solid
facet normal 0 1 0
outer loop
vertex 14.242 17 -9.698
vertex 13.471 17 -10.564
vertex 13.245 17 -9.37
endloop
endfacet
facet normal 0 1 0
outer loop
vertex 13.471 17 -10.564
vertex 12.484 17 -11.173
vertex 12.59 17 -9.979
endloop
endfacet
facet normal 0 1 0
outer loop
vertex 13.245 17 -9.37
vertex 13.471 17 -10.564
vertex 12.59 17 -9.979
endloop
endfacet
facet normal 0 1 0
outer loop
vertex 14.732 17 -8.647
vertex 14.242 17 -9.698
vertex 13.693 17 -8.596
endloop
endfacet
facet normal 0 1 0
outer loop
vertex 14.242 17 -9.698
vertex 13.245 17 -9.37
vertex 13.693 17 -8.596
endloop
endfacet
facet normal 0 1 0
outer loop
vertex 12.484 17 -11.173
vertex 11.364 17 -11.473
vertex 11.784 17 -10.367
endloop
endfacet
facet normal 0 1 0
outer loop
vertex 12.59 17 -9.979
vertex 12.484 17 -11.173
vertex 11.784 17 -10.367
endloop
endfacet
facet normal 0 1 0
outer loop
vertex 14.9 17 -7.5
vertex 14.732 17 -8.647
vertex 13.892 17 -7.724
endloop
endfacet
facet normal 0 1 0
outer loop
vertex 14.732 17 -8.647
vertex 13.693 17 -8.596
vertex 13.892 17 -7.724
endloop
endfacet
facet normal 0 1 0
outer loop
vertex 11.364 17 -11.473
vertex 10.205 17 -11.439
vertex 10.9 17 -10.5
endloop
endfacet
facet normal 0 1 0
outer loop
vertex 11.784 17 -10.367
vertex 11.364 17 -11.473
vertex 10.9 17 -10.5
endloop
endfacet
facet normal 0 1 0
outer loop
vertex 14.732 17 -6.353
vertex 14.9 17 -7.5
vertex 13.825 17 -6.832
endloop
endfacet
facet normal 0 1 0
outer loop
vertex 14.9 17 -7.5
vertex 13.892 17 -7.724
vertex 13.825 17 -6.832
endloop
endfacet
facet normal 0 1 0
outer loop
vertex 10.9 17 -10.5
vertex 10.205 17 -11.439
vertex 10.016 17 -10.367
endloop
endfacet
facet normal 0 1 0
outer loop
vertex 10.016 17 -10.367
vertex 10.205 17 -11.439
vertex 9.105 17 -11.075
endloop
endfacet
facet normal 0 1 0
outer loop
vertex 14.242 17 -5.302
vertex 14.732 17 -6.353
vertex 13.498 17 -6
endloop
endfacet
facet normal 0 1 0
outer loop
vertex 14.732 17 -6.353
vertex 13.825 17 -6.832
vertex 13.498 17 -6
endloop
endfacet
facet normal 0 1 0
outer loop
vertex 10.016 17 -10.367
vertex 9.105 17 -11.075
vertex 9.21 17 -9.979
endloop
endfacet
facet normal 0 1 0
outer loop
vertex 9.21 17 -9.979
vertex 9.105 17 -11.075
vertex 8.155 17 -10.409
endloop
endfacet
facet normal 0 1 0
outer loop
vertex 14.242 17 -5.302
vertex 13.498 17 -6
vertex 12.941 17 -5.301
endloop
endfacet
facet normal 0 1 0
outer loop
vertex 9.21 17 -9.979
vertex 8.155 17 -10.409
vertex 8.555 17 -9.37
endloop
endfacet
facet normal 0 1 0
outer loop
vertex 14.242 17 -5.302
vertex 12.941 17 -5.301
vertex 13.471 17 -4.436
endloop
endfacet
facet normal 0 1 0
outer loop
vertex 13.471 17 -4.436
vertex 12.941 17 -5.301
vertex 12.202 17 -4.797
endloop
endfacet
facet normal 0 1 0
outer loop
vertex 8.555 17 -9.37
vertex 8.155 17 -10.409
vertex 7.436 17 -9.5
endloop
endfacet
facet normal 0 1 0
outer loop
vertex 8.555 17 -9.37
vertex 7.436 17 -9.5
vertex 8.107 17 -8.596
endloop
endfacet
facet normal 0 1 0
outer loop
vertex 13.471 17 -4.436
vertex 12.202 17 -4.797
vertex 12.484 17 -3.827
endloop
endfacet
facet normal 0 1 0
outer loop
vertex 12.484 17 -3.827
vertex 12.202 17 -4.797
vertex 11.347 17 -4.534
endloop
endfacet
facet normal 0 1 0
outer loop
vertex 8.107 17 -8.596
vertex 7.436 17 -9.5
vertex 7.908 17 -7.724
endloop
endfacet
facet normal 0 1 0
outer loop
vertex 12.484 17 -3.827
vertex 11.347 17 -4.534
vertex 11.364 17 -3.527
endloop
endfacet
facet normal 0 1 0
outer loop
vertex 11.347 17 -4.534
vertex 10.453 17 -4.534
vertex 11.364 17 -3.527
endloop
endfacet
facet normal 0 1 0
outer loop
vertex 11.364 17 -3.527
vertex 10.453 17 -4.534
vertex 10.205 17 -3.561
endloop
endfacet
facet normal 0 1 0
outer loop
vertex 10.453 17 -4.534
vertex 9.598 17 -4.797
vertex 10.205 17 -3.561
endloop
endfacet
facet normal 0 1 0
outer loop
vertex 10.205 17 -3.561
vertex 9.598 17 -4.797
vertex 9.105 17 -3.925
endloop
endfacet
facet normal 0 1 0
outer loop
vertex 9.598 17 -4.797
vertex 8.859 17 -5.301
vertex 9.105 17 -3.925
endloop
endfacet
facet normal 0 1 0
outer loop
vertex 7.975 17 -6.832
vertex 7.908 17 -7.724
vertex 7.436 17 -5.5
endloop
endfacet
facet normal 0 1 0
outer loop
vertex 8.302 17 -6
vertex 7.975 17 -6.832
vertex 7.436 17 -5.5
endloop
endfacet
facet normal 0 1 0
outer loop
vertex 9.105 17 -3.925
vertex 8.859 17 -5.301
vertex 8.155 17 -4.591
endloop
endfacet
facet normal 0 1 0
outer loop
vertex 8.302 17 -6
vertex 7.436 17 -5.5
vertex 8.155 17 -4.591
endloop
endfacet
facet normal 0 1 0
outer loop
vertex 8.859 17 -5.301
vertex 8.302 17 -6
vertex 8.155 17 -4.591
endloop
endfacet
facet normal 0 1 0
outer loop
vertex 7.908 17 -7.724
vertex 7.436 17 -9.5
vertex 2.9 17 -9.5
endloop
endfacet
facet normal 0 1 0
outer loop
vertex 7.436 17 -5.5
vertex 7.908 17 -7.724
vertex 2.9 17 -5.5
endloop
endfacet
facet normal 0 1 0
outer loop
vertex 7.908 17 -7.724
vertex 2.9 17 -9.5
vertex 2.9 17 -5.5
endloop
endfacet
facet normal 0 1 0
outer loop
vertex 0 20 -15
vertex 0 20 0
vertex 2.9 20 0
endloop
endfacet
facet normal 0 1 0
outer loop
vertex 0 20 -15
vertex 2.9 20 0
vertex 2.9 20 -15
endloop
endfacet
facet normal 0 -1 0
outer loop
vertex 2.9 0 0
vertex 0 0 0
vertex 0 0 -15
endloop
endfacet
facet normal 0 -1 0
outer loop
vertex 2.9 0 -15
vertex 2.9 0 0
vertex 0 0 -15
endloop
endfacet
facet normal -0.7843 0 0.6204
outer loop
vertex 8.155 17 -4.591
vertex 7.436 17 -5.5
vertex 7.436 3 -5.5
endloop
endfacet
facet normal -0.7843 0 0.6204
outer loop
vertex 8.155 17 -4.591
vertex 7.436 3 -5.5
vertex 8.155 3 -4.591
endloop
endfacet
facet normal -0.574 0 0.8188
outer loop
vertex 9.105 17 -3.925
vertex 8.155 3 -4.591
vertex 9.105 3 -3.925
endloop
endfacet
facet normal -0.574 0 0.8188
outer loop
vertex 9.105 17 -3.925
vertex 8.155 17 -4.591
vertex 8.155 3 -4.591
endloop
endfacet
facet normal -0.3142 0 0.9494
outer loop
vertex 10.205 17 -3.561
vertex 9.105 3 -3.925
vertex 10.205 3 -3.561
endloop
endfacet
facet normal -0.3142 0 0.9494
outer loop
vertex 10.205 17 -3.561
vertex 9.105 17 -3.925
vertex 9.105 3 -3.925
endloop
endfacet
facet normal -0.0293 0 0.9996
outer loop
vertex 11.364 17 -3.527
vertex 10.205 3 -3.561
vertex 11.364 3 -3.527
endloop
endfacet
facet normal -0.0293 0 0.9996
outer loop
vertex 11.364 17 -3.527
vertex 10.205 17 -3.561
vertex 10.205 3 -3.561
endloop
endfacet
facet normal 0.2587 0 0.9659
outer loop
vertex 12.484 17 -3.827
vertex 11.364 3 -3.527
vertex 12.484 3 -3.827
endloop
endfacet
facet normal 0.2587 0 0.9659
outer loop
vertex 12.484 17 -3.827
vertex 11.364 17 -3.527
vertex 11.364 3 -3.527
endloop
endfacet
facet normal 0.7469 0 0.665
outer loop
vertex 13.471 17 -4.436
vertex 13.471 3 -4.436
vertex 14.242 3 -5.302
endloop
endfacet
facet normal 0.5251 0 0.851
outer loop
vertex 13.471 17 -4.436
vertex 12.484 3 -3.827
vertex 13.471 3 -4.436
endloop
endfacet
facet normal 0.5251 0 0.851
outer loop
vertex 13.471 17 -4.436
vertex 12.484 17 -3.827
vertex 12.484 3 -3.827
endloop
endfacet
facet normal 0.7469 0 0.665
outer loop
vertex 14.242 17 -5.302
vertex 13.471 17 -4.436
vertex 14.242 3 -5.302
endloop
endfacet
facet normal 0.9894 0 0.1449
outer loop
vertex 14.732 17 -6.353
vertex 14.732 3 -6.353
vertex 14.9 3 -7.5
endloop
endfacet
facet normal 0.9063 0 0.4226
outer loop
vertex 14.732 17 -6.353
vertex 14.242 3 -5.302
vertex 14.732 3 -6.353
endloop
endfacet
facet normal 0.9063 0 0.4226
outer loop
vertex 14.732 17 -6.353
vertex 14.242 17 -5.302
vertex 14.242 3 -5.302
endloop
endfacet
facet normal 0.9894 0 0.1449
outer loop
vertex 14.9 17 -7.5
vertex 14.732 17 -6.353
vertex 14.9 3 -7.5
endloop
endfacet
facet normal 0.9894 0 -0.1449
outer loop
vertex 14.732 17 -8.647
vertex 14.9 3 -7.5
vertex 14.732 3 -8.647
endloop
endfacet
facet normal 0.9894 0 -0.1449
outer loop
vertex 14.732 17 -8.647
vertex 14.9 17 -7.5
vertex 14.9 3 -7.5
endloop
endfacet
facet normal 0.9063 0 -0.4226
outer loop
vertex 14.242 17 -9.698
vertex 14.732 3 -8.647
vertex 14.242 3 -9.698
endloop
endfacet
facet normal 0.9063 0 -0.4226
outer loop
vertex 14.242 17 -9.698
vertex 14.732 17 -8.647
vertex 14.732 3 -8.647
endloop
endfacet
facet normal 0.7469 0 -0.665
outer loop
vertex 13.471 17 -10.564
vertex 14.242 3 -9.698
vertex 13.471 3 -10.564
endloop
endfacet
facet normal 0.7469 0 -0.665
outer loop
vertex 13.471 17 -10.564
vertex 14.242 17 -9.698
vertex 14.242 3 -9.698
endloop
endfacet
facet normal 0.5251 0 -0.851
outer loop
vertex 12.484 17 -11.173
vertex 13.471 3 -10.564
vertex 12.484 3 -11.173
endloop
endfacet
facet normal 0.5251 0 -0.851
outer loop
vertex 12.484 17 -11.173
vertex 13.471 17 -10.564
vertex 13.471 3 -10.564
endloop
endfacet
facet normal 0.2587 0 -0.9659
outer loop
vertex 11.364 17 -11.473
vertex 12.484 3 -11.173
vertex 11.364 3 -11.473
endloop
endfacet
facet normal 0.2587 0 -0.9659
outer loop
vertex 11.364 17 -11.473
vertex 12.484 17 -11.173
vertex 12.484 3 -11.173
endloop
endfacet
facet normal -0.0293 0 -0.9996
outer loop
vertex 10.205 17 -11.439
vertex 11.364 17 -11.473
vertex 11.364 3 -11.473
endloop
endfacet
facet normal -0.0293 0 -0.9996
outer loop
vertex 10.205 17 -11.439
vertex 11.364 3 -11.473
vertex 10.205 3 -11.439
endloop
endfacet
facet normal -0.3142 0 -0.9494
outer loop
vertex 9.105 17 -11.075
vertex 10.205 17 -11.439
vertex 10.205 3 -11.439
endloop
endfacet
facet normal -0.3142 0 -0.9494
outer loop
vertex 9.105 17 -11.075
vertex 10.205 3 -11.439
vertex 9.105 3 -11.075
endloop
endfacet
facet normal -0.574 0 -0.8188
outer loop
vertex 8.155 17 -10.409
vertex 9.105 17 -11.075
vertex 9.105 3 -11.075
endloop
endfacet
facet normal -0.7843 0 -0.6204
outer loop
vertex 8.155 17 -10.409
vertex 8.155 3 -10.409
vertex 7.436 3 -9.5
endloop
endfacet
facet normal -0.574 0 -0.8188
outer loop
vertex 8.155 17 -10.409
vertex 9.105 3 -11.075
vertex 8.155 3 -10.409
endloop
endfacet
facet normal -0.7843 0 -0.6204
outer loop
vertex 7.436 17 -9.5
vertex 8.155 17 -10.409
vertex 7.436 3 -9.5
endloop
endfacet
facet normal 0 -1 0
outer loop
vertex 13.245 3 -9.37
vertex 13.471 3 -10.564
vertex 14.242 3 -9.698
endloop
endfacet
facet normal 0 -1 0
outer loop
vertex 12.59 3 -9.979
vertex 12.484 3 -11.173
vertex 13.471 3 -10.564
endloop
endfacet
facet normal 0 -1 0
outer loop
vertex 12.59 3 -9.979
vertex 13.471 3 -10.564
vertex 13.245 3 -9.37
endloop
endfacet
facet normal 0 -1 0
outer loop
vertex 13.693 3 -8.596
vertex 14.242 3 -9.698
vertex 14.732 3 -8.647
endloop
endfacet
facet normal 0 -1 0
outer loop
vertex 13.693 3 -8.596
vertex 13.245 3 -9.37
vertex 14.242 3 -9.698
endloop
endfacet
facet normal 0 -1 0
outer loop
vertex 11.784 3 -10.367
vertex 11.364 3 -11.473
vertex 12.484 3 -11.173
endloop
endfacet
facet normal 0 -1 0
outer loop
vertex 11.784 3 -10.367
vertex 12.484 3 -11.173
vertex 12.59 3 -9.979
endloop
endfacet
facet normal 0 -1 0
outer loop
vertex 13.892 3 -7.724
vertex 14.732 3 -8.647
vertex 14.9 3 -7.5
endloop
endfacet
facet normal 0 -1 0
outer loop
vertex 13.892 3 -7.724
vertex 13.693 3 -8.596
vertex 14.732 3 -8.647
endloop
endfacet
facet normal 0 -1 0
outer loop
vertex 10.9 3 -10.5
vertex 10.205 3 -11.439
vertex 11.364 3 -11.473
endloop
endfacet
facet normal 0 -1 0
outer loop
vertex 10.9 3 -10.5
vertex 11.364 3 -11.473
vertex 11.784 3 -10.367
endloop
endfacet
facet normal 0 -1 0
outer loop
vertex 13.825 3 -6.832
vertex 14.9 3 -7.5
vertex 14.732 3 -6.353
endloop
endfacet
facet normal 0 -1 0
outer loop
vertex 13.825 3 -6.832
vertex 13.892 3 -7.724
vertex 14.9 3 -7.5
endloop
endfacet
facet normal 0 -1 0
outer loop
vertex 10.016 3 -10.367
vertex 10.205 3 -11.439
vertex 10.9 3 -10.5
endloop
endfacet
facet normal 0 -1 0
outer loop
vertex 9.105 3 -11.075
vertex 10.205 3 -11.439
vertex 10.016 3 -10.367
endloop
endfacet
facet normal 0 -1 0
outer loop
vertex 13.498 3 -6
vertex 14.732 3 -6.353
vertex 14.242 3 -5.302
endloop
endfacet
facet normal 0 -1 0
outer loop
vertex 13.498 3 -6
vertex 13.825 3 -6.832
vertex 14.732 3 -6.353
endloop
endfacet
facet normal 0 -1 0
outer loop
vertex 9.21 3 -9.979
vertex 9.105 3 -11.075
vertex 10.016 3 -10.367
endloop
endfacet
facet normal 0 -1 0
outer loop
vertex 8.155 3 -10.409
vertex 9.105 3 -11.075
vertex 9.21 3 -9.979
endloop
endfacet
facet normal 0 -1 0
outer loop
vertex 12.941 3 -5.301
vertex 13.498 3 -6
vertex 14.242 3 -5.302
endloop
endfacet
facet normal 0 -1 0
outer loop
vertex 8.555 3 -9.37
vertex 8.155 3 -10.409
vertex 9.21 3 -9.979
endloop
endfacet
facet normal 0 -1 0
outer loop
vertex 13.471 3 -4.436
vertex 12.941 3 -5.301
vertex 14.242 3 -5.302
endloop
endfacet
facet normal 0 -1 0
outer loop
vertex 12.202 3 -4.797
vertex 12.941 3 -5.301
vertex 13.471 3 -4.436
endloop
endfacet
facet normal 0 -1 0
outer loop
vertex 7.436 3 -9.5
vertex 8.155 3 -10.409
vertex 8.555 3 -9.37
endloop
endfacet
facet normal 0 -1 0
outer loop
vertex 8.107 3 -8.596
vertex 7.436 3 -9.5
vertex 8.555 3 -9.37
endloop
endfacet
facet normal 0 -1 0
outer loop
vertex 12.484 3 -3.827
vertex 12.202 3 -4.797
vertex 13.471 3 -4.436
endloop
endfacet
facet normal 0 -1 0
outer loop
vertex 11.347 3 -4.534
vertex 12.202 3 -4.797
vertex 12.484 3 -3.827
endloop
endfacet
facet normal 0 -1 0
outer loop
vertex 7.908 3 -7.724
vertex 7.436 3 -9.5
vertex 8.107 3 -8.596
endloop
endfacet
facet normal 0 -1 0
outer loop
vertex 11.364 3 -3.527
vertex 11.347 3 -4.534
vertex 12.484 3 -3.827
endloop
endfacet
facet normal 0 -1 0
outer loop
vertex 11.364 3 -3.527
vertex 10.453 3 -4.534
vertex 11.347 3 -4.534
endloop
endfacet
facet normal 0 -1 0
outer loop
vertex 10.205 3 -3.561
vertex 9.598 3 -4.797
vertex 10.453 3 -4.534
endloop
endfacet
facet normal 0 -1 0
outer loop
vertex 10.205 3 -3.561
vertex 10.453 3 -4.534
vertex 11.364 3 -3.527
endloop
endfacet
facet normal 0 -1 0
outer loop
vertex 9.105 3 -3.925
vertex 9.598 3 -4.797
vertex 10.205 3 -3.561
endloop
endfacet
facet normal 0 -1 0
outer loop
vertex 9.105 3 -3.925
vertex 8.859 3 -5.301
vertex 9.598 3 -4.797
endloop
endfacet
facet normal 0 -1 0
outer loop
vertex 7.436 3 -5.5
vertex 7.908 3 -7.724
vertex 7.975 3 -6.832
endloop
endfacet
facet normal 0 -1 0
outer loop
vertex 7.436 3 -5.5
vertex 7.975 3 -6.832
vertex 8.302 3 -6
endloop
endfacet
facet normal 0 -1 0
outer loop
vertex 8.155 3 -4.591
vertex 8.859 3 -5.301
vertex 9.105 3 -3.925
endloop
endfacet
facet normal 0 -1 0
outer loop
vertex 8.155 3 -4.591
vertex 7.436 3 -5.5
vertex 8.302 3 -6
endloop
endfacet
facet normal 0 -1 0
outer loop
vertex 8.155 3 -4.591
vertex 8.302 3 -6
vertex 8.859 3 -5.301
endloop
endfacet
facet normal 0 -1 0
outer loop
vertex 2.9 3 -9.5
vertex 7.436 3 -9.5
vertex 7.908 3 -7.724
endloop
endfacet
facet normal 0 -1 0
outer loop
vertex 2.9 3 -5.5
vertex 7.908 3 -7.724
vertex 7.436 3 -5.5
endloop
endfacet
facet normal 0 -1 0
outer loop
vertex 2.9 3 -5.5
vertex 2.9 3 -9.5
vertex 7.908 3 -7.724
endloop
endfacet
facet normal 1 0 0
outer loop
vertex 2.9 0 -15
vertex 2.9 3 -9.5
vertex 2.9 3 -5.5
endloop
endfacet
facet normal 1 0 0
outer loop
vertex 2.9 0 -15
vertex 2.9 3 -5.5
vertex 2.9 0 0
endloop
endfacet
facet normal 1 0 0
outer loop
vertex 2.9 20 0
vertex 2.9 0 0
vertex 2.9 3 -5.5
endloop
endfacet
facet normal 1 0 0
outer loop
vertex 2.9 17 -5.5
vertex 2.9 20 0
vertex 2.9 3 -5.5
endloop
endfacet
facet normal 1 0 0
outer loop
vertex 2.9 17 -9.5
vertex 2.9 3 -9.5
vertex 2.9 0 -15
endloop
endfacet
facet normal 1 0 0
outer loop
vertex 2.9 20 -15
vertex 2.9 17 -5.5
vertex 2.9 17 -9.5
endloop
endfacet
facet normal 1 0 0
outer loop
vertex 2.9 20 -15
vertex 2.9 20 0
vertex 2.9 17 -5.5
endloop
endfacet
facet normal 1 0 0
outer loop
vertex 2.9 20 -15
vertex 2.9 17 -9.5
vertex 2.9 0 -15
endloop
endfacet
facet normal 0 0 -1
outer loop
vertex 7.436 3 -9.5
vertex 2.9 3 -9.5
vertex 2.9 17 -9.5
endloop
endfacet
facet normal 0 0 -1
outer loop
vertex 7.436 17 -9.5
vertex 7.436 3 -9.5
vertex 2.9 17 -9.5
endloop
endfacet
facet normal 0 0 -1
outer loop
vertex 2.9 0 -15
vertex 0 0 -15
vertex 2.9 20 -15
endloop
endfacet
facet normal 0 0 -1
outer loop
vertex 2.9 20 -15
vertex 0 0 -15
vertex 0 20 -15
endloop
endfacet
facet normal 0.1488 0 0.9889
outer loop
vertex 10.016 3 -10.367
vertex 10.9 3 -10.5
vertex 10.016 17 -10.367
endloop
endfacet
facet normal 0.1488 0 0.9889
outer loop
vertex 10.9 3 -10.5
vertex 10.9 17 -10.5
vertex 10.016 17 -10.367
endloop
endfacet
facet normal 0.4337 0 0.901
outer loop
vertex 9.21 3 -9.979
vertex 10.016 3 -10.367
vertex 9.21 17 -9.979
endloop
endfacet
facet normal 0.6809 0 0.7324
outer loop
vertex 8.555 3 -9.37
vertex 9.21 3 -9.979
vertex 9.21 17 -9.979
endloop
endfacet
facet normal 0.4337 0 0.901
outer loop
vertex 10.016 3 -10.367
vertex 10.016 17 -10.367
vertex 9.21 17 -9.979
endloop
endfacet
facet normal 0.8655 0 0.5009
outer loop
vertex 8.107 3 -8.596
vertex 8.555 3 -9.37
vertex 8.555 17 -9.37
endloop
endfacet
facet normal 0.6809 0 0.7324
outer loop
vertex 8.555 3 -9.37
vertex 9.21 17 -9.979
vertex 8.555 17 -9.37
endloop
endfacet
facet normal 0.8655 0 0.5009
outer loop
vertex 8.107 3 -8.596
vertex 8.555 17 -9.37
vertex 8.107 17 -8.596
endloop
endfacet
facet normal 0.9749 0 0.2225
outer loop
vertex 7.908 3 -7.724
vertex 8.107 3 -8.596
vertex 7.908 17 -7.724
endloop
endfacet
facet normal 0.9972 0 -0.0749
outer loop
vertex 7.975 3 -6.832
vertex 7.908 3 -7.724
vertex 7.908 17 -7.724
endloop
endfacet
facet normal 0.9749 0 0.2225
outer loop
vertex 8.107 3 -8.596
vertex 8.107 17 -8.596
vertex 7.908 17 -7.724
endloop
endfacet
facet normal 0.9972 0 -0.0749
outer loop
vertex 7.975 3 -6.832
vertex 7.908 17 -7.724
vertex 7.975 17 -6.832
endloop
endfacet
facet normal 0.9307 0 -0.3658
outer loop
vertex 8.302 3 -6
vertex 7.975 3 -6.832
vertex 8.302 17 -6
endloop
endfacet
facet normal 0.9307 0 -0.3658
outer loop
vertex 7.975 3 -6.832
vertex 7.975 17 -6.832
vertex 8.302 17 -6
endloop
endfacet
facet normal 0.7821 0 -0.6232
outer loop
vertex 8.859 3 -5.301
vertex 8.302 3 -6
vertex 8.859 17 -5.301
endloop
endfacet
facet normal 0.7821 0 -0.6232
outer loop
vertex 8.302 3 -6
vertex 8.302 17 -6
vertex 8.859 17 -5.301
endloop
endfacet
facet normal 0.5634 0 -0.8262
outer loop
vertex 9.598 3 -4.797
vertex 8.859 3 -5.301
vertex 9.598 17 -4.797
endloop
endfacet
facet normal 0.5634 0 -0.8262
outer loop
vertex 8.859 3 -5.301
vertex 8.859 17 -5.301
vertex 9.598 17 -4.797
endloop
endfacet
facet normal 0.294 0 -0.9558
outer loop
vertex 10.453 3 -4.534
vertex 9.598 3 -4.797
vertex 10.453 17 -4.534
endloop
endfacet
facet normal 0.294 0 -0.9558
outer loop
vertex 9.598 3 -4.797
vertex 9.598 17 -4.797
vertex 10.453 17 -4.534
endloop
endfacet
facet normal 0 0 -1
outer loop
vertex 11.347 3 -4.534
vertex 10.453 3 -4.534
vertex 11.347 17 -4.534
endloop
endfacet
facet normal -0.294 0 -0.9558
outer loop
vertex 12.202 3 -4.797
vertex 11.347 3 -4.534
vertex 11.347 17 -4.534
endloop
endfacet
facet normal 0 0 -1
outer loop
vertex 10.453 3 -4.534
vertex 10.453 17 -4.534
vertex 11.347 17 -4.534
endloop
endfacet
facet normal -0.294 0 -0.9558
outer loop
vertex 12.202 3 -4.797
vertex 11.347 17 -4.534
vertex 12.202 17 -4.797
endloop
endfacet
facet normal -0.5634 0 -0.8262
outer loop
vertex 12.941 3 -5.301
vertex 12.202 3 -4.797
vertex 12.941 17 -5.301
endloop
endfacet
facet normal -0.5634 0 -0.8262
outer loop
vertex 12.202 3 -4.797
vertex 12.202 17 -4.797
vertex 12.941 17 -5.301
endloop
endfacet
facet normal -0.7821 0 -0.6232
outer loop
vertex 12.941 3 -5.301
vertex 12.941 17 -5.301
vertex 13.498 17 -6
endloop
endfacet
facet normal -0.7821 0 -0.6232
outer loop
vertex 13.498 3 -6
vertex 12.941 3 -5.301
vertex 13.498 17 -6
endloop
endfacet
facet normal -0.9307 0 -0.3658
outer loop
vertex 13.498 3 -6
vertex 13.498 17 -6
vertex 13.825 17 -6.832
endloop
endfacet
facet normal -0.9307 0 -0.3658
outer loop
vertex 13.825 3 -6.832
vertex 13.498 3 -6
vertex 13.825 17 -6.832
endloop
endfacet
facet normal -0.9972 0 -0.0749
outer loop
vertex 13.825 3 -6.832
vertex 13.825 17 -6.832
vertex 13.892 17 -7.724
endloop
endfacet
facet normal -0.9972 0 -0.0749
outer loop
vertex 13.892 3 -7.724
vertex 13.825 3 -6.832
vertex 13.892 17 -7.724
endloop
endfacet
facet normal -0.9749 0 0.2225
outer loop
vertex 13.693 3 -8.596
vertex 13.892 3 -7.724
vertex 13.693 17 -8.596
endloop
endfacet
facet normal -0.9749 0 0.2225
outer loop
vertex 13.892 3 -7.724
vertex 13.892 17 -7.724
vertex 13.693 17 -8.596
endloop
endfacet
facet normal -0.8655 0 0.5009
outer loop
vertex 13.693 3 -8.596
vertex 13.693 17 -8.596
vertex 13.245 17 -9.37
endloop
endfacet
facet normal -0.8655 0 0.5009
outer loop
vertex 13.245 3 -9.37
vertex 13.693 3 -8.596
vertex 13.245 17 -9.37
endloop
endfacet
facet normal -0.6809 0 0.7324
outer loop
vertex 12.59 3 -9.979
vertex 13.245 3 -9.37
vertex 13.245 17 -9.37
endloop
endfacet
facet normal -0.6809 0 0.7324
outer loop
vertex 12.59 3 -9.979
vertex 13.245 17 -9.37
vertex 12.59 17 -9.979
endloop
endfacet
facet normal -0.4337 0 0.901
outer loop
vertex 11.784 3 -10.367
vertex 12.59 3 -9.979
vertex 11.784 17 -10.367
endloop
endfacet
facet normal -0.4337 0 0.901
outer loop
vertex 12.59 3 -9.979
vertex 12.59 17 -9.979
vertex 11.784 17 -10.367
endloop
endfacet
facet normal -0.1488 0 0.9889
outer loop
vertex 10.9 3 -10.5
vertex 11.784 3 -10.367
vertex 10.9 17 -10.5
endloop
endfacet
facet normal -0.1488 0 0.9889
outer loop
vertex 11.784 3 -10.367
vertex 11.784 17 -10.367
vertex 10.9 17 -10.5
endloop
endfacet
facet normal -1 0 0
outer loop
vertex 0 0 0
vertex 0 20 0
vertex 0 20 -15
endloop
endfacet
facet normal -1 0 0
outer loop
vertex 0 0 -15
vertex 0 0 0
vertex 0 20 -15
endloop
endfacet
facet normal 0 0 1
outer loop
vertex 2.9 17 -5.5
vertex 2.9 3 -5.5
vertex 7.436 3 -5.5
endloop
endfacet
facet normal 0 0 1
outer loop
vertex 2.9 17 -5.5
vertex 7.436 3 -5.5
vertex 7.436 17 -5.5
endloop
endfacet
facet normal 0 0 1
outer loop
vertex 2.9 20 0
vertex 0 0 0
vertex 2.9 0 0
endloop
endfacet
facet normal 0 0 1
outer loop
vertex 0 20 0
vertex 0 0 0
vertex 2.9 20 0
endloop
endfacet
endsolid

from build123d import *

# Parameters (mm, degrees)
SKETCH1_W                = 15
SKETCH1_H                = 20
BOSS_EXTRUDE1_DEPTH      = 2.9
SKETCH2_W                = 1
SKETCH2_H                = 14
BOSS_EXTRUDE2_REACH      = 29.731
BOSS_EXTRUDE2_END_RADIUS = 4
SKETCH4_W                = 4
SKETCH4_H                = 14


with BuildPart() as part:
    # Sketch1 → Boss-Extrude1 (new body)
    with BuildSketch(Plane(origin=(0, 0, 0), x_dir=(0, 0, -1), z_dir=(1, 0, 0))):
        with Locations((7.5, 10)):
            Rectangle(SKETCH1_W, SKETCH1_H)
    extrude(amount=BOSS_EXTRUDE1_DEPTH)



with BuildPart() as body_2:
    # Sketch2 → Revolve1 (revolve)
    with BuildSketch(Plane(origin=(10.9, 0, 0), x_dir=(0, 0, -1), z_dir=(1, 0, 0))):
        with Locations((11, 10)):
            Rectangle(SKETCH2_W, SKETCH2_H)
    revolve(axis=Axis((10.9, 0, -7.5), (0, 1, 0)))


with BuildPart() as part_1:
    add(part.part)

    add(body_2.part)  # Boss-Extrude2 merges body 2
    # Boss-Extrude2: up to this cylinder (the profile starts outside it)
    boss_extrude2_end = Plane(origin=(10.9, 10, -7.5), z_dir=(0, -1, 0)) * Cylinder(BOSS_EXTRUDE2_END_RADIUS, 68.462, mode=Mode.PRIVATE)
    # Sketch4 → Boss-Extrude2 (add, up to the surface)
    with BuildSketch(Plane(origin=(2.9, 0, 0), x_dir=(0, 0, -1), z_dir=(1, 0, 0)), mode=Mode.PRIVATE) as boss_extrude2_sk1:
        with Locations((7.5, 10)):
            Rectangle(SKETCH4_W, SKETCH4_H)
    boss_extrude2_tool1 = extrude(boss_extrude2_sk1.sketch, amount=BOSS_EXTRUDE2_REACH, mode=Mode.PRIVATE) - boss_extrude2_end
    add(boss_extrude2_tool1.solids().sort_by_distance((2.9, 10, -7.5))[0])


solid = part_1.part
